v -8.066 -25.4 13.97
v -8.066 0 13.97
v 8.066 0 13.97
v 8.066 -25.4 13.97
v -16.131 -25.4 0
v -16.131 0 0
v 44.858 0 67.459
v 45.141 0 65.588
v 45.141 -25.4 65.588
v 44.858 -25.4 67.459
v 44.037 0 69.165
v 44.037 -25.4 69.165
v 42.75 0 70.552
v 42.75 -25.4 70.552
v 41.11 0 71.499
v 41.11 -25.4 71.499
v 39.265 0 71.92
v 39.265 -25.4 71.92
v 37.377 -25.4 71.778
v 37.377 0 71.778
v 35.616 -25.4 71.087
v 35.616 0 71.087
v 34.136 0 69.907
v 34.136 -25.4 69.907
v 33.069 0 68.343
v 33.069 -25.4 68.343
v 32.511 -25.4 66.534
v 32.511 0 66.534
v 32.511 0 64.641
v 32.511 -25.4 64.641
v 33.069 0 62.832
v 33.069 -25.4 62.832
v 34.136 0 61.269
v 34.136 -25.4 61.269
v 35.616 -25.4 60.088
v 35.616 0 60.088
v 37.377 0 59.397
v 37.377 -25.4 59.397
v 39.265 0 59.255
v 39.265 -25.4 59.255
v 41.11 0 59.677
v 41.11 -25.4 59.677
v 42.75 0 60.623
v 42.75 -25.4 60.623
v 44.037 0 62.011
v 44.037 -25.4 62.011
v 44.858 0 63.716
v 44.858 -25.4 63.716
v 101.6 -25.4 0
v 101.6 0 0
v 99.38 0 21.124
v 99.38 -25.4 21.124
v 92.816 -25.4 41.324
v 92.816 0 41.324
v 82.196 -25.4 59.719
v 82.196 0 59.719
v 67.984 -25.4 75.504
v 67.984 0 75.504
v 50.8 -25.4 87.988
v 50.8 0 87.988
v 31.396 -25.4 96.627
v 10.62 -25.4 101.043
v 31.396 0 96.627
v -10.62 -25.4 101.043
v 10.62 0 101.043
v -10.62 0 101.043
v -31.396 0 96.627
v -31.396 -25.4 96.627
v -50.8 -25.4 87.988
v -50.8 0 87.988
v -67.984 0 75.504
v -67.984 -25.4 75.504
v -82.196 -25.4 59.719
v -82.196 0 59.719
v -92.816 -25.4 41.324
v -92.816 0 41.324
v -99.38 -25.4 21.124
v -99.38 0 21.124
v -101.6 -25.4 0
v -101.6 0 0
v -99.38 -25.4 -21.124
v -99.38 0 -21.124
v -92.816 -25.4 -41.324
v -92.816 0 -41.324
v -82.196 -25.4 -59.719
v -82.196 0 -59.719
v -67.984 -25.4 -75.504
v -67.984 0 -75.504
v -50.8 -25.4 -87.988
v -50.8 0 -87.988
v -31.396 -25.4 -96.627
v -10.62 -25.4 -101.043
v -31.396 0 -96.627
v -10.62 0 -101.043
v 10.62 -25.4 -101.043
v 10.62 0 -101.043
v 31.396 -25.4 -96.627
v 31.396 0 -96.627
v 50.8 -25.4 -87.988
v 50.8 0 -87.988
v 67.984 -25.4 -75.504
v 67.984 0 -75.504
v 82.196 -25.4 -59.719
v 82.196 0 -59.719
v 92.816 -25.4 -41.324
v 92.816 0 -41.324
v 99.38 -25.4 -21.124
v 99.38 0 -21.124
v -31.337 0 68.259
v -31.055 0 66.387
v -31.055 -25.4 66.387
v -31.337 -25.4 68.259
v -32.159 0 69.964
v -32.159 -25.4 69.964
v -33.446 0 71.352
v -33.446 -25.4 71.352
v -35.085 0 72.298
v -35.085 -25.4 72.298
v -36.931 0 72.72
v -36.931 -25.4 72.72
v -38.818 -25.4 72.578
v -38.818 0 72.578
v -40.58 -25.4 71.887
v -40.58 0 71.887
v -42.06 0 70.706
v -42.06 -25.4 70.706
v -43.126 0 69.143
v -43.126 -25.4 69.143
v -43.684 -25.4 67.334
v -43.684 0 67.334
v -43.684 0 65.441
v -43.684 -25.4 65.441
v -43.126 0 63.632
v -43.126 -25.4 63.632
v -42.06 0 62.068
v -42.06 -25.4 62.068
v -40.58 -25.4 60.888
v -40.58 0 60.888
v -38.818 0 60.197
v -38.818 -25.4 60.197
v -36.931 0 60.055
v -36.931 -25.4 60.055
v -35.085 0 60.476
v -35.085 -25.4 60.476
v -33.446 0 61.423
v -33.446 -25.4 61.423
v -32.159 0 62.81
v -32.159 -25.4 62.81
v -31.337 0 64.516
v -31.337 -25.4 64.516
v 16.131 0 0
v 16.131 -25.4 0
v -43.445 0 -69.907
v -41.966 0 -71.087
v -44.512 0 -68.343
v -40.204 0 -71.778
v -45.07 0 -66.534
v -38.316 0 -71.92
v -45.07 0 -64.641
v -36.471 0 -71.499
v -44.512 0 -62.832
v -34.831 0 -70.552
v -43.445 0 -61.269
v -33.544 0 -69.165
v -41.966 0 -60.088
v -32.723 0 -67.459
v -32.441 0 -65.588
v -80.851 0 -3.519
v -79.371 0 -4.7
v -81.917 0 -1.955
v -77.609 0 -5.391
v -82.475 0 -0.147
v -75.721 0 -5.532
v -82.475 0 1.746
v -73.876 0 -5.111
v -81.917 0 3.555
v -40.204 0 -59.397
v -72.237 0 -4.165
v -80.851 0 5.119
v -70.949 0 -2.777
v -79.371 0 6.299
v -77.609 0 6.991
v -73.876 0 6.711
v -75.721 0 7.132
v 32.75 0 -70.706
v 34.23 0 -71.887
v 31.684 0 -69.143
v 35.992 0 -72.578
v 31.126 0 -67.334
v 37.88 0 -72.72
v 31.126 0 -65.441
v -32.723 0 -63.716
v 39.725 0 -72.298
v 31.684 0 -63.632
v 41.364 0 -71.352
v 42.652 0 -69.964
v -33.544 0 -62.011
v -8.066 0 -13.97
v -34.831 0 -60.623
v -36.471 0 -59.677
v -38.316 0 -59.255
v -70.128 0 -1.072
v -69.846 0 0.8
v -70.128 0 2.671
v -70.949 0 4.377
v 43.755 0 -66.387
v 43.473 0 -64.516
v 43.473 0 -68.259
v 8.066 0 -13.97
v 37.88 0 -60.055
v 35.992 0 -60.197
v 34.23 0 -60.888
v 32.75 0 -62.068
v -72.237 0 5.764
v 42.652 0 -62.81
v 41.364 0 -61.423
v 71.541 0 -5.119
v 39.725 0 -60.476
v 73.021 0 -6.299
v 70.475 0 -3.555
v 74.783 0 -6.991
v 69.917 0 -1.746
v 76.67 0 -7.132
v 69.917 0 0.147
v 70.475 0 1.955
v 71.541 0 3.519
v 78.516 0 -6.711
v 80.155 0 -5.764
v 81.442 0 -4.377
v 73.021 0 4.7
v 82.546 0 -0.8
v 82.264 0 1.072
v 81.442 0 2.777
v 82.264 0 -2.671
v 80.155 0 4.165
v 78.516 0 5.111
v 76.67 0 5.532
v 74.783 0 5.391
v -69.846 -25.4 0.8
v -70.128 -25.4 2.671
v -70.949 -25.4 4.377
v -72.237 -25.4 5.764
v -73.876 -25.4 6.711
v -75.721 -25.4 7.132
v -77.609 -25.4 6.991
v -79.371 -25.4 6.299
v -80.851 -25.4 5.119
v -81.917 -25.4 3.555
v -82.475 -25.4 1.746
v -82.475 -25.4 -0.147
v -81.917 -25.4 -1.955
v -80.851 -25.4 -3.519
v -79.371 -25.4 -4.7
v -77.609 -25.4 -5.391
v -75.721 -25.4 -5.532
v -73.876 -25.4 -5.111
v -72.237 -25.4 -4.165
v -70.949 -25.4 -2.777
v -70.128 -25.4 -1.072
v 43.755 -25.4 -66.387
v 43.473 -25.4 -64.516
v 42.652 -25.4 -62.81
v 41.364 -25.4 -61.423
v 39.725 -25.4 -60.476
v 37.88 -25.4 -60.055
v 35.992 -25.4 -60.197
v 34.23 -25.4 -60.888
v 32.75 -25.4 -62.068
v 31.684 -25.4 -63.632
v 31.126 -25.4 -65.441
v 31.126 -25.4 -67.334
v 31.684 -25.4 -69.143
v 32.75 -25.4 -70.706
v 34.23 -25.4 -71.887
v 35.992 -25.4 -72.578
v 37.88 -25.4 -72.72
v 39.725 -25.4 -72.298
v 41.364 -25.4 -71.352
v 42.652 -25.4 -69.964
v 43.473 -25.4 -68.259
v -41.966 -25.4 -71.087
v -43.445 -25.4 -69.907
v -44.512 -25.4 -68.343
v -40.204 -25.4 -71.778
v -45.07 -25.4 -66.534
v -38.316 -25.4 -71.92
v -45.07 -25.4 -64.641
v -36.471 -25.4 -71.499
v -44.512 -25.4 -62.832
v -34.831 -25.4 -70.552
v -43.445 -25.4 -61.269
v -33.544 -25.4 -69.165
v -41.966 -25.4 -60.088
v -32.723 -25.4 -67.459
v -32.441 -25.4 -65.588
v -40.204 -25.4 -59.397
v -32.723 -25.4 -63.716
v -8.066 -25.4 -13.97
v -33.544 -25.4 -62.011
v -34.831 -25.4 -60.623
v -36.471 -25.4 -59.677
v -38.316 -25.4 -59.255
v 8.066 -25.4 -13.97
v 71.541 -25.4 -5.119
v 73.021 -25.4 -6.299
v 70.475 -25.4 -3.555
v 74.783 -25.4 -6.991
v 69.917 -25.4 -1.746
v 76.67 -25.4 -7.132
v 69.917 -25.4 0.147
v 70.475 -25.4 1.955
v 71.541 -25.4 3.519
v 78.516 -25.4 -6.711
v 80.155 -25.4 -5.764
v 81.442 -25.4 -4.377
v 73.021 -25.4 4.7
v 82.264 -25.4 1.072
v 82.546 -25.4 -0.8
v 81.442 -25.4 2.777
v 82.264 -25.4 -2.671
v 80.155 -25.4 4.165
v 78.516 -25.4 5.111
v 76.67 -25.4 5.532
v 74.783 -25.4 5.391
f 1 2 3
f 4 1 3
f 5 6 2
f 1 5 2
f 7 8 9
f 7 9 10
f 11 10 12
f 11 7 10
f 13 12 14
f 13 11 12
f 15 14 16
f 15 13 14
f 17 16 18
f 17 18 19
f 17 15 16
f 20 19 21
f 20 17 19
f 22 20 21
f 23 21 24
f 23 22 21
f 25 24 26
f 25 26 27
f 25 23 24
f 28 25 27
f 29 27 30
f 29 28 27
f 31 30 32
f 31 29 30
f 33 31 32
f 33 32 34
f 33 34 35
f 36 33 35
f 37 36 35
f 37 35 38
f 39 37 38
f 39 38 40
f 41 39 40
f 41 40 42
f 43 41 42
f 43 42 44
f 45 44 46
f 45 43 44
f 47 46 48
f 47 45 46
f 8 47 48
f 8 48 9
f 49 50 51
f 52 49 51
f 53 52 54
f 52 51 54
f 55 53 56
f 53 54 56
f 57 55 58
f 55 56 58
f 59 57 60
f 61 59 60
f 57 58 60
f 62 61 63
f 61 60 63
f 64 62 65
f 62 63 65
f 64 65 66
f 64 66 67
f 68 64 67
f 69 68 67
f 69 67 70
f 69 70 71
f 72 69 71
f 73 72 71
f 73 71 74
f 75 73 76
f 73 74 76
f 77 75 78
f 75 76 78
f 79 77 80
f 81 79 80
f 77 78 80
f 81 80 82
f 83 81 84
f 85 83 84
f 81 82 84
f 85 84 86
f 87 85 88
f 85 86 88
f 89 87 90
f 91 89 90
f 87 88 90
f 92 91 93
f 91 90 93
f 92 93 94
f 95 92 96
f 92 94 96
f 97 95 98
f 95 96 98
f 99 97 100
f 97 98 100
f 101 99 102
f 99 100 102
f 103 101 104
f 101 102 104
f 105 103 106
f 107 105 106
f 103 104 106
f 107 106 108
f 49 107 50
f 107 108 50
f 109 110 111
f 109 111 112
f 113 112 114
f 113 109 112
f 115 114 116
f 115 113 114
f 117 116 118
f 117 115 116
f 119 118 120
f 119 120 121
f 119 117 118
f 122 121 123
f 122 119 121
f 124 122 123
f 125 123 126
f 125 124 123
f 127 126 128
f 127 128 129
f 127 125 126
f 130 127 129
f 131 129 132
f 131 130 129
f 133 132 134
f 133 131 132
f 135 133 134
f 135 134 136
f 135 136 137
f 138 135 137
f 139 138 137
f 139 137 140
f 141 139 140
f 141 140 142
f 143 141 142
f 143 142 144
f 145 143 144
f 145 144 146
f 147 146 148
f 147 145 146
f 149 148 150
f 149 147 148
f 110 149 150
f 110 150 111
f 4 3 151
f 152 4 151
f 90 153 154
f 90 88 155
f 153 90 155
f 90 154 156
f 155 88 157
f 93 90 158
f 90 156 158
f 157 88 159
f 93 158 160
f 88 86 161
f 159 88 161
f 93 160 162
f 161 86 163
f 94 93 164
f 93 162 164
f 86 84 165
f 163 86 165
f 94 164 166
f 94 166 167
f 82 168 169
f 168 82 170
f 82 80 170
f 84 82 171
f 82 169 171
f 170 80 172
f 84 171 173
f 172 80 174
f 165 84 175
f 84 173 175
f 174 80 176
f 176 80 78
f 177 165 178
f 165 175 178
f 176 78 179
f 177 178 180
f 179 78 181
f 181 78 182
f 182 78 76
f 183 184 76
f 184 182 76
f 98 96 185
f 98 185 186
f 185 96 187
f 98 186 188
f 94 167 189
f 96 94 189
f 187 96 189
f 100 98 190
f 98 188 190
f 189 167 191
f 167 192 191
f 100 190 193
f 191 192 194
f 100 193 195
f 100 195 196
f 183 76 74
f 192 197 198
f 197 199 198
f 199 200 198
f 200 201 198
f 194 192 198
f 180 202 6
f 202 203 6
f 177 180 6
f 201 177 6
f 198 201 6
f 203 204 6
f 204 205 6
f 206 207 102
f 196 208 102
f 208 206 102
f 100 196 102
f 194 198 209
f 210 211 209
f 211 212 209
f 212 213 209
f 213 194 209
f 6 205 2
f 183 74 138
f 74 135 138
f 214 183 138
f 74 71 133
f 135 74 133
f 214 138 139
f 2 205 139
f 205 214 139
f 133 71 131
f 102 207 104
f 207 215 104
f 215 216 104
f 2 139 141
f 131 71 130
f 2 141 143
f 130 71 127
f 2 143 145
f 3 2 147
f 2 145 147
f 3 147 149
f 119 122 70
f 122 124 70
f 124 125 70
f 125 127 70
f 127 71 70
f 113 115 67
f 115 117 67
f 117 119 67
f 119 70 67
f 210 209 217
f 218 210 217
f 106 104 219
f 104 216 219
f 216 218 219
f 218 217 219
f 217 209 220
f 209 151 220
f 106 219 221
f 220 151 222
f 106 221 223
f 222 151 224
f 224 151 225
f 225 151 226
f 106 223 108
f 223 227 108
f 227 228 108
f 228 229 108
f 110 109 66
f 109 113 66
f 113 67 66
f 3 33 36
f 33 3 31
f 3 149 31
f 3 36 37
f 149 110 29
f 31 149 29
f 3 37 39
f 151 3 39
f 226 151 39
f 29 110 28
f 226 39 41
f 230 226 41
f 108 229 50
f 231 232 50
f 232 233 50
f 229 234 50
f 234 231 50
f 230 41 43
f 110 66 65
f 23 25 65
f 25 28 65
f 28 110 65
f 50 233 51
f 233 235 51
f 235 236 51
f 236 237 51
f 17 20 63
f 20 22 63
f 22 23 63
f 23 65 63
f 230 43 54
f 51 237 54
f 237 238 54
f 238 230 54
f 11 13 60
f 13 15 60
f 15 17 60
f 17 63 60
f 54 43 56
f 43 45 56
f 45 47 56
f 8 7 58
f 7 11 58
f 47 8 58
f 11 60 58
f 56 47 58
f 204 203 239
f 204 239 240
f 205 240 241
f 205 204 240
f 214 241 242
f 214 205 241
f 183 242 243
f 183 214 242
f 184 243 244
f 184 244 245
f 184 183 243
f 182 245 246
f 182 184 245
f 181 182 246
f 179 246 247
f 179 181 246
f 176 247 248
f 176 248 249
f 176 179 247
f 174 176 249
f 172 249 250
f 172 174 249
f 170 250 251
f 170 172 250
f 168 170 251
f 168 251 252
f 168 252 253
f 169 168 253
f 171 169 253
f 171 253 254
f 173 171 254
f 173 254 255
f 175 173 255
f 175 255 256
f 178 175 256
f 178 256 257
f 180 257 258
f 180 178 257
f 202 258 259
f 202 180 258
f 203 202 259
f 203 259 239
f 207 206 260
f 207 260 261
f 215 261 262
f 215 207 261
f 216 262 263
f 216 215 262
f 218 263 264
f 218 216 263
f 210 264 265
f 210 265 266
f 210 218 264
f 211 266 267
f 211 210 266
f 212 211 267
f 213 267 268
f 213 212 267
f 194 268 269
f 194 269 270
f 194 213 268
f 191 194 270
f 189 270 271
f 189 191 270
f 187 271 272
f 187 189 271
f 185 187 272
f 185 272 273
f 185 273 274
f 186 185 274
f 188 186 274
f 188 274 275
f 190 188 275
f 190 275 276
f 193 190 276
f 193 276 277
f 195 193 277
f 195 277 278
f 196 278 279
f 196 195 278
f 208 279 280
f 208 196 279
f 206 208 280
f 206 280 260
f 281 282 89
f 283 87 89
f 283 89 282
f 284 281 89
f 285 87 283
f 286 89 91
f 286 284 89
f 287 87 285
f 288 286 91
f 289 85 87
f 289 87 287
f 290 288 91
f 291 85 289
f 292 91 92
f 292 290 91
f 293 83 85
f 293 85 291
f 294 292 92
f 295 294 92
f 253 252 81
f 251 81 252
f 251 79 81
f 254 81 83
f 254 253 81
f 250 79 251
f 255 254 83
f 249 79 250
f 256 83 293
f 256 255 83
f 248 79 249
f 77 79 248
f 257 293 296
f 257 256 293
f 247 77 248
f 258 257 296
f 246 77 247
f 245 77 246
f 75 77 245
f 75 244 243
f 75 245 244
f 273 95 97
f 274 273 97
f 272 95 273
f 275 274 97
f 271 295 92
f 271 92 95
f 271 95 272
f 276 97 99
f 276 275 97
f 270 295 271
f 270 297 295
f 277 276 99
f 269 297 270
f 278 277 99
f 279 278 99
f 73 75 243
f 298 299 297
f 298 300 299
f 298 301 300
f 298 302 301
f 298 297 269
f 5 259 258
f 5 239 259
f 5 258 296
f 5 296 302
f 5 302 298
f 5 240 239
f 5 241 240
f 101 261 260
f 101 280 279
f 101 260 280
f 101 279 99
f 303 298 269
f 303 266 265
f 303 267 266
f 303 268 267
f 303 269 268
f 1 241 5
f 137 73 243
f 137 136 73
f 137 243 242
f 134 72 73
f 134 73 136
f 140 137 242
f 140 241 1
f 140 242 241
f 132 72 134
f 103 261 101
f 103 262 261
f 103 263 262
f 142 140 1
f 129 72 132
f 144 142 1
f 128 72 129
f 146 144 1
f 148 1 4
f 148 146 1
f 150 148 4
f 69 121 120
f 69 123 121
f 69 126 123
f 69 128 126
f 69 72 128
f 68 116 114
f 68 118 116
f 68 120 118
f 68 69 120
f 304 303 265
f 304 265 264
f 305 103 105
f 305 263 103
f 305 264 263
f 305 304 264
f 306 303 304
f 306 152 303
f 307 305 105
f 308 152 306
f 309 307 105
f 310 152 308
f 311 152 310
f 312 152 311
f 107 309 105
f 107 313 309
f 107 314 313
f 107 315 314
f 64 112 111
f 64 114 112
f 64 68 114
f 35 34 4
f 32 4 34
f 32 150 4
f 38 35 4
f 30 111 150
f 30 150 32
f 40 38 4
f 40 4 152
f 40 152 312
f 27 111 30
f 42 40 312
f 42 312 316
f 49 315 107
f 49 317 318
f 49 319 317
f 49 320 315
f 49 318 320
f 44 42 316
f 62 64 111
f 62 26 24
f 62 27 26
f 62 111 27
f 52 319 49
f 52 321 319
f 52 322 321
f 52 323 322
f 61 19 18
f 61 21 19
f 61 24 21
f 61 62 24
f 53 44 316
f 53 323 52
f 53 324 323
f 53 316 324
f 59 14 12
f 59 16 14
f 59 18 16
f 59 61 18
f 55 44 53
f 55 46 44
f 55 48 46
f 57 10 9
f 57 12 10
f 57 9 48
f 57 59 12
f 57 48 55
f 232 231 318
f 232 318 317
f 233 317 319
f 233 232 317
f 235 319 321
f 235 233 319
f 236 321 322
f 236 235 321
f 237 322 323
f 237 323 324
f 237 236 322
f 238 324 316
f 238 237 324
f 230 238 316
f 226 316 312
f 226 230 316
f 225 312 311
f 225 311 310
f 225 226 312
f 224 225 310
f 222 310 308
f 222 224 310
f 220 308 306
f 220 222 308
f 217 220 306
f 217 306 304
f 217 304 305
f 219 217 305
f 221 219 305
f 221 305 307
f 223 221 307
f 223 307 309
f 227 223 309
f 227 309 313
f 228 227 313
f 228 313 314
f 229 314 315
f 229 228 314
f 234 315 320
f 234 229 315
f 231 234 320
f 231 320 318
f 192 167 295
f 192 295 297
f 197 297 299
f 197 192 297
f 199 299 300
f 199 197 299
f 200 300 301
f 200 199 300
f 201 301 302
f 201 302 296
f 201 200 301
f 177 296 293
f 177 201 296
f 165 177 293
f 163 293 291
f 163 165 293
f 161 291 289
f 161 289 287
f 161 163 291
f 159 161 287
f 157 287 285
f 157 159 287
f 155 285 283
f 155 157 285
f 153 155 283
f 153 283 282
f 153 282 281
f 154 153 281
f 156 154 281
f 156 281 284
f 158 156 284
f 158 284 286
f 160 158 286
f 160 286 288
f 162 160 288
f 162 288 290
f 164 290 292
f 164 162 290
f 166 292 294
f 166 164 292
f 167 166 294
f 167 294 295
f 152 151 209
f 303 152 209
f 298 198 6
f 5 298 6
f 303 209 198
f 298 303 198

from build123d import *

# Parameters (mm, degrees)
F0_R     = 101.6
F0_R_2   = 6.35
F1_DEPTH = 25.4


with BuildPart() as f1:
    # F0 (on Front) → F1 (new body)
    with BuildSketch(Plane.XZ):
        Circle(F0_R)
        with Locations((-38.790503, -65.587628)):
            Circle(F0_R_2, mode=Mode.SUBTRACT)
        Polygon((16.131167, 0), (8.065583, -13.97), (-8.065583, -13.97), (-16.131167, 0), (-8.065583, 13.97), (8.065583, 13.97), align=None, mode=Mode.SUBTRACT)
        with Locations((37.4053, -66.387375)):
            Circle(F0_R_2, mode=Mode.SUBTRACT)
        with Locations((76.195803, -0.799747)):
            Circle(F0_R_2, mode=Mode.SUBTRACT)
        with Locations((-76.195803, 0.799747)):
            Circle(F0_R_2, mode=Mode.SUBTRACT)
        with Locations((-37.4053, 66.387375)):
            Circle(F0_R_2, mode=Mode.SUBTRACT)
        with Locations((38.790503, 65.587628)):
            Circle(F0_R_2, mode=Mode.SUBTRACT)
    extrude(amount=F1_DEPTH)


solid = f1.part
